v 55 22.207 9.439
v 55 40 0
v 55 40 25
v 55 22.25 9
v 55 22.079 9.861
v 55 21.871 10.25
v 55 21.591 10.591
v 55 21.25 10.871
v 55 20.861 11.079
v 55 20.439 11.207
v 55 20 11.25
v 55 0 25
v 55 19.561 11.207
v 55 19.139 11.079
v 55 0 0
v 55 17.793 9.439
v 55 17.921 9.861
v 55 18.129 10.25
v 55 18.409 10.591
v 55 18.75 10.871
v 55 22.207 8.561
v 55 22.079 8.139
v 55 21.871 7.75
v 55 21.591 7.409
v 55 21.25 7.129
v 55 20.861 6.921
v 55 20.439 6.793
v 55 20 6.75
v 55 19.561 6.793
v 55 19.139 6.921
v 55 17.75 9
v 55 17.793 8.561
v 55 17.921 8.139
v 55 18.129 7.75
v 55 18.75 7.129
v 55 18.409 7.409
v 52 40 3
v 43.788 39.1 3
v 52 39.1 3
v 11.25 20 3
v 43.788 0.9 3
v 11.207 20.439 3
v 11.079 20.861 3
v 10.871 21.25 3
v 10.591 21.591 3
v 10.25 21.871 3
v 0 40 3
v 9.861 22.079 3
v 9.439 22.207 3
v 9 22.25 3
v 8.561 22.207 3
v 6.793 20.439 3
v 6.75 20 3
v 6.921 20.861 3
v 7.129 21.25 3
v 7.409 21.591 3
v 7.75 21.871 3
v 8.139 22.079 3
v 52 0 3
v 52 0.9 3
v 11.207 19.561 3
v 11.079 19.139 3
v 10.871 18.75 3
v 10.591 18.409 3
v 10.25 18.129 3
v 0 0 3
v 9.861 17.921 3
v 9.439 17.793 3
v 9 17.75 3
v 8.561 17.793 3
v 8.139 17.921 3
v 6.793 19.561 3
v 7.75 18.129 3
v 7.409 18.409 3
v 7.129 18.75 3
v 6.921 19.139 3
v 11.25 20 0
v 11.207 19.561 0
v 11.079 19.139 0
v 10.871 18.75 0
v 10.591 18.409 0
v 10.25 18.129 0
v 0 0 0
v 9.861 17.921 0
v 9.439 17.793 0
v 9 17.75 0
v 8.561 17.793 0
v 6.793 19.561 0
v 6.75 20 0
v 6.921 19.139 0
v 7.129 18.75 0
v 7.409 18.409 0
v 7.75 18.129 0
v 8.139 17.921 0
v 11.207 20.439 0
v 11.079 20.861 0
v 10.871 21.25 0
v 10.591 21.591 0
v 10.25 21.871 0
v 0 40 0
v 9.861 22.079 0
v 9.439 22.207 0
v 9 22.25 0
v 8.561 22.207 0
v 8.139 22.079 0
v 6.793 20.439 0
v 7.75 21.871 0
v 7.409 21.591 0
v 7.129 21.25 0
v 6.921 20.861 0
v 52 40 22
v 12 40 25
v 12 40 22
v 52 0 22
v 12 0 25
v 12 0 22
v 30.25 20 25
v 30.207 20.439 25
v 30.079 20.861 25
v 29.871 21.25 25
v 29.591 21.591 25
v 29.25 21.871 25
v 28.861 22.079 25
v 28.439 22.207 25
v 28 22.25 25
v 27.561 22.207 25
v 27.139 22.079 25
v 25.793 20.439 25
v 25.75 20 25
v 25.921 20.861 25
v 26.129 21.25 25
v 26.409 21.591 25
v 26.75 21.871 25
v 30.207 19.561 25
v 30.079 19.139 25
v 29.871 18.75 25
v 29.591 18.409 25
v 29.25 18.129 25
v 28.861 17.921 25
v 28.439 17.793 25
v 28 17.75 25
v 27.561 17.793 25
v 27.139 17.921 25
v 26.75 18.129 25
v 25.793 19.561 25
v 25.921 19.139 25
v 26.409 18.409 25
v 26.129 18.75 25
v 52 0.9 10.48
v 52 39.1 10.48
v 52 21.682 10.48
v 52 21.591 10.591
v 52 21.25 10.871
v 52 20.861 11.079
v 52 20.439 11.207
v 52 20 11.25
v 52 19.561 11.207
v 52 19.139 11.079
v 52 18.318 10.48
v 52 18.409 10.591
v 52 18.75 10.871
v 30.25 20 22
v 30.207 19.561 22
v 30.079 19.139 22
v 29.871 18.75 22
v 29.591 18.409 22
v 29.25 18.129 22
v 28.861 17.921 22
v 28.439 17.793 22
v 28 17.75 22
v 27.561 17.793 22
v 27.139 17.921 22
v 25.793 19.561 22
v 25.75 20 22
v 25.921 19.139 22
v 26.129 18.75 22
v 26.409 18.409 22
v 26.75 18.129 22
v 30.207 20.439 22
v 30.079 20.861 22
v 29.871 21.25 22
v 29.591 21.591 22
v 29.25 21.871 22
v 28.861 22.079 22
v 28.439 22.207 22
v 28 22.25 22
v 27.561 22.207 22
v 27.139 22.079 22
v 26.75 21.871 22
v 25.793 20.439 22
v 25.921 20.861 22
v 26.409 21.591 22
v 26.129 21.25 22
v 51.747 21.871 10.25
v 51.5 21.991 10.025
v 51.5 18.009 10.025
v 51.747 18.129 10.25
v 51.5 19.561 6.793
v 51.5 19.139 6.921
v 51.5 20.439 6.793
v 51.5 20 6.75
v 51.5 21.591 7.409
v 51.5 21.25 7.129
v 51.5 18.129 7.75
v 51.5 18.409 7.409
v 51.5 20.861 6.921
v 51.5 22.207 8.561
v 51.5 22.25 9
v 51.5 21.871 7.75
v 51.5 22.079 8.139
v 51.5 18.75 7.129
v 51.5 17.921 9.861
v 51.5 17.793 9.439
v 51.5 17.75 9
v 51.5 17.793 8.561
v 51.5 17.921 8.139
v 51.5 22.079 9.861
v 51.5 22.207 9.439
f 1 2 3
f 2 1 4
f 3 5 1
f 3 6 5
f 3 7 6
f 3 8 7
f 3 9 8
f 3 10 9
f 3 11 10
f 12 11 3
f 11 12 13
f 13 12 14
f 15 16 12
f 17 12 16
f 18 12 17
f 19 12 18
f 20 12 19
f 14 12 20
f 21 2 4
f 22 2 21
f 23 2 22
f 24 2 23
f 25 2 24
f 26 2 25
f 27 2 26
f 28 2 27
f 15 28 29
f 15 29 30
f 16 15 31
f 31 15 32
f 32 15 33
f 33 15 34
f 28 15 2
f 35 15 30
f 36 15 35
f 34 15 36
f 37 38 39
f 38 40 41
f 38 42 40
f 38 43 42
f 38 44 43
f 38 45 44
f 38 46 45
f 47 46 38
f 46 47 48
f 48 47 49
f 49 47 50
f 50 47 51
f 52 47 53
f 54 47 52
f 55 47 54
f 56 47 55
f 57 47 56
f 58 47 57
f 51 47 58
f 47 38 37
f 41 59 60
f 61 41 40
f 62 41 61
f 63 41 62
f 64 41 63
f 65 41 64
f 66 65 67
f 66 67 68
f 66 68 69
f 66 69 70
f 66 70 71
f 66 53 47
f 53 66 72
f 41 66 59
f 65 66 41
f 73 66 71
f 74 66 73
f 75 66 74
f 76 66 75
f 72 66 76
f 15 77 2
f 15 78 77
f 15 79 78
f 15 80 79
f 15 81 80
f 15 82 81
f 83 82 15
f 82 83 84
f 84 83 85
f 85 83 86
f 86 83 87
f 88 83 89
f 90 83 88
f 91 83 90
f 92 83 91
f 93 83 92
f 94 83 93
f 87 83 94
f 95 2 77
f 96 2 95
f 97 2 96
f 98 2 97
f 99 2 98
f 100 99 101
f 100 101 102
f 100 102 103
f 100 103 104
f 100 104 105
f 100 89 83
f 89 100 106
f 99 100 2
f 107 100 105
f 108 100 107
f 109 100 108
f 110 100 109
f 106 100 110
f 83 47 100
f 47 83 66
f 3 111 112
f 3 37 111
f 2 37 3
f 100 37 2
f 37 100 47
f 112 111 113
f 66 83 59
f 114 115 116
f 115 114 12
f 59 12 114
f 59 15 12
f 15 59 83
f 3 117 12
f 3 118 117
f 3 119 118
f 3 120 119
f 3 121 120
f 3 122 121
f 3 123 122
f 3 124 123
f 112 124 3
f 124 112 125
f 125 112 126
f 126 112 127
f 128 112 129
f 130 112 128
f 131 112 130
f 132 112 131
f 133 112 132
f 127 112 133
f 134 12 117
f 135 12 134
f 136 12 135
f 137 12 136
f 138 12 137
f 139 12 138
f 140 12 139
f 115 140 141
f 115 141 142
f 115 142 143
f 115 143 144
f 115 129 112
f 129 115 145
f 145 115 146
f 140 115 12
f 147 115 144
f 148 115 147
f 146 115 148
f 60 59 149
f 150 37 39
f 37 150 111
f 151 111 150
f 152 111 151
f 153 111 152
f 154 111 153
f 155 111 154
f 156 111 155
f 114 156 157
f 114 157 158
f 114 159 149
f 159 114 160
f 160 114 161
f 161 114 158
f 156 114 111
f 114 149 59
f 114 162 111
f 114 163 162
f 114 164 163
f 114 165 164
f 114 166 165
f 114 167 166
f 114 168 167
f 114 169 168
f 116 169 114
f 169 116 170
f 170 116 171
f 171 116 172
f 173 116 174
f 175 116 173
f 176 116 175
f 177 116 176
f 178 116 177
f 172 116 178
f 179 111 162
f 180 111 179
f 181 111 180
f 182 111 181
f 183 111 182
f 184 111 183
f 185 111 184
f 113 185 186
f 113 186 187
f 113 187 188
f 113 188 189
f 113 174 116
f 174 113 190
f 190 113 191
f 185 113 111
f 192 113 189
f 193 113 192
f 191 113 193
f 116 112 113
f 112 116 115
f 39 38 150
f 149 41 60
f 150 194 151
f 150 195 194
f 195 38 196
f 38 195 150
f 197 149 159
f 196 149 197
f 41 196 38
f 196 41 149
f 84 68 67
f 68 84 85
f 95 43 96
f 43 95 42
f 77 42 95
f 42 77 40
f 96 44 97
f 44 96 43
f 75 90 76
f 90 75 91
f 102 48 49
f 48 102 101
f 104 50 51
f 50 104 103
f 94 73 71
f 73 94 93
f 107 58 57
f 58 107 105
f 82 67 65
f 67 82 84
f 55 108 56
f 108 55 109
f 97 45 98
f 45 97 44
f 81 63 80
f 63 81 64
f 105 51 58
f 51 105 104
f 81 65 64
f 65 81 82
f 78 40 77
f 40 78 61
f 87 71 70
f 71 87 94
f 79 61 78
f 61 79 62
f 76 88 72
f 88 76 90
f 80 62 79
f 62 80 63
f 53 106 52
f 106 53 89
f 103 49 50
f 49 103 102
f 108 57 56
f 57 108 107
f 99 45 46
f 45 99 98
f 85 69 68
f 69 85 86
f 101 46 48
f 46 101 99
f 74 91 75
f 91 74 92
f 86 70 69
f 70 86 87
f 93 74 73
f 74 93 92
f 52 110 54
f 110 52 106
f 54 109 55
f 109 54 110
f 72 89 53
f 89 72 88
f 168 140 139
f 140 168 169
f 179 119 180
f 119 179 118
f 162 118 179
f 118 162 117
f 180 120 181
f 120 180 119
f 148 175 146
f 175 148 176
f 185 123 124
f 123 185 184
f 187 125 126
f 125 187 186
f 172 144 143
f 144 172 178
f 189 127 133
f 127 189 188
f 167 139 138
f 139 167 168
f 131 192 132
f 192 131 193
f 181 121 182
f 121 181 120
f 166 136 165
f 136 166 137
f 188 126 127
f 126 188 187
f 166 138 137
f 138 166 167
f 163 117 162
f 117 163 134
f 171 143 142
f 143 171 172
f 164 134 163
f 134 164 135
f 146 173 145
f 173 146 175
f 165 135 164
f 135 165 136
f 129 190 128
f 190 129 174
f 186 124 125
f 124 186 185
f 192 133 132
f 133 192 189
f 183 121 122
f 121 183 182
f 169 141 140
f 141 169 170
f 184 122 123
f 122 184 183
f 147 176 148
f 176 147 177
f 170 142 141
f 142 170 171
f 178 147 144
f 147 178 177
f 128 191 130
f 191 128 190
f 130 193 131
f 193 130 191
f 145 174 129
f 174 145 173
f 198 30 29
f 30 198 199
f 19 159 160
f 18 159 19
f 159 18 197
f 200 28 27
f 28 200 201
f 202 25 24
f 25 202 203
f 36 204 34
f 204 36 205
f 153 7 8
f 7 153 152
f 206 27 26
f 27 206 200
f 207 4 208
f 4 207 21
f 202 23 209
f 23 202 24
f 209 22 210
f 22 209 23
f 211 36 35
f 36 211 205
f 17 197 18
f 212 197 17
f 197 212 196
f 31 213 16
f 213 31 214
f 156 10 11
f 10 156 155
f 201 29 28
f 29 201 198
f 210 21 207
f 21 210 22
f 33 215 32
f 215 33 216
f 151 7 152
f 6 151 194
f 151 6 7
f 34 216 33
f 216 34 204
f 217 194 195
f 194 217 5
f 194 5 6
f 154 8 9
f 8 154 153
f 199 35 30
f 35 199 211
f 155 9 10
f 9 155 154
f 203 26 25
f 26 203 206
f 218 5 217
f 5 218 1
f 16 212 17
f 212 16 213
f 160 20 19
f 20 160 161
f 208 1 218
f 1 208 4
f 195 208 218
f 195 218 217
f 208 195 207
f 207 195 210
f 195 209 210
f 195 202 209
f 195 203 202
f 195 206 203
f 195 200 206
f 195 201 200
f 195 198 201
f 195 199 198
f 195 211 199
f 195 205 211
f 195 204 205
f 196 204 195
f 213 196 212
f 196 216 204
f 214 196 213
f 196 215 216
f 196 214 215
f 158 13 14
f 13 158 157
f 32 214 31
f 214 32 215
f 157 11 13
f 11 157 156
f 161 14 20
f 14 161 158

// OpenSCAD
$fn = 32;

// ----------------------------------------------------------------------
// Z-bracket: 55 x 40 x 25 mm
// ----------------------------------------------------------------------

// --- parameters (mm) ---
bottom_run = 55;          // lower foot length, X
top_run = 40;             // upper foot length, X
profile_w = 40;           // bracket width, Y
height = 25;              // overall rise, Z
mat_t = 3;                // plate thickness
hole_d = 4.5;             // clearance for M4
rib_len = 9.2;            // gusset leg
rib_sink = 0.9;           // gusset overlap into the plates

module hole_z(px, py, z0) {
  translate([px, py, z0 - 0.5]) cylinder(h = mat_t + 1, d = hole_d);
}
module hole_x(py, pz) {
  translate([-0.5, py, pz]) rotate([0, 90, 0]) cylinder(h = mat_t + 1, d = hole_d);
}
module gusset(x0) {
  translate([x0, profile_w - rib_sink, 0])
    rotate([90, 0, 0])
      linear_extrude(height = profile_w - 2 * rib_sink)
        polygon(points = [[rib_sink, mat_t - rib_sink],
                          [rib_sink, mat_t - rib_sink + rib_len],
                          [-rib_len, mat_t - rib_sink]]);
}

difference() {
  union() {
    cube([bottom_run, profile_w, mat_t]);
    /* web, overlapping the lower foot */
    translate([bottom_run - mat_t, 0, 0]) cube([mat_t, profile_w, height]);
    /* upper foot, sunk into the web */
    translate([bottom_run - mat_t - top_run, 0, height - mat_t]) cube([top_run + mat_t, profile_w, mat_t]);
    gusset(bottom_run - mat_t);
  }
  hole_z(9, 20, 0);
  translate([bottom_run - mat_t - 24, 0, 0]) hole_z(0, 20, height - mat_t);
  translate([bottom_run - mat_t, 0, 0]) hole_x(20, 9);
}
